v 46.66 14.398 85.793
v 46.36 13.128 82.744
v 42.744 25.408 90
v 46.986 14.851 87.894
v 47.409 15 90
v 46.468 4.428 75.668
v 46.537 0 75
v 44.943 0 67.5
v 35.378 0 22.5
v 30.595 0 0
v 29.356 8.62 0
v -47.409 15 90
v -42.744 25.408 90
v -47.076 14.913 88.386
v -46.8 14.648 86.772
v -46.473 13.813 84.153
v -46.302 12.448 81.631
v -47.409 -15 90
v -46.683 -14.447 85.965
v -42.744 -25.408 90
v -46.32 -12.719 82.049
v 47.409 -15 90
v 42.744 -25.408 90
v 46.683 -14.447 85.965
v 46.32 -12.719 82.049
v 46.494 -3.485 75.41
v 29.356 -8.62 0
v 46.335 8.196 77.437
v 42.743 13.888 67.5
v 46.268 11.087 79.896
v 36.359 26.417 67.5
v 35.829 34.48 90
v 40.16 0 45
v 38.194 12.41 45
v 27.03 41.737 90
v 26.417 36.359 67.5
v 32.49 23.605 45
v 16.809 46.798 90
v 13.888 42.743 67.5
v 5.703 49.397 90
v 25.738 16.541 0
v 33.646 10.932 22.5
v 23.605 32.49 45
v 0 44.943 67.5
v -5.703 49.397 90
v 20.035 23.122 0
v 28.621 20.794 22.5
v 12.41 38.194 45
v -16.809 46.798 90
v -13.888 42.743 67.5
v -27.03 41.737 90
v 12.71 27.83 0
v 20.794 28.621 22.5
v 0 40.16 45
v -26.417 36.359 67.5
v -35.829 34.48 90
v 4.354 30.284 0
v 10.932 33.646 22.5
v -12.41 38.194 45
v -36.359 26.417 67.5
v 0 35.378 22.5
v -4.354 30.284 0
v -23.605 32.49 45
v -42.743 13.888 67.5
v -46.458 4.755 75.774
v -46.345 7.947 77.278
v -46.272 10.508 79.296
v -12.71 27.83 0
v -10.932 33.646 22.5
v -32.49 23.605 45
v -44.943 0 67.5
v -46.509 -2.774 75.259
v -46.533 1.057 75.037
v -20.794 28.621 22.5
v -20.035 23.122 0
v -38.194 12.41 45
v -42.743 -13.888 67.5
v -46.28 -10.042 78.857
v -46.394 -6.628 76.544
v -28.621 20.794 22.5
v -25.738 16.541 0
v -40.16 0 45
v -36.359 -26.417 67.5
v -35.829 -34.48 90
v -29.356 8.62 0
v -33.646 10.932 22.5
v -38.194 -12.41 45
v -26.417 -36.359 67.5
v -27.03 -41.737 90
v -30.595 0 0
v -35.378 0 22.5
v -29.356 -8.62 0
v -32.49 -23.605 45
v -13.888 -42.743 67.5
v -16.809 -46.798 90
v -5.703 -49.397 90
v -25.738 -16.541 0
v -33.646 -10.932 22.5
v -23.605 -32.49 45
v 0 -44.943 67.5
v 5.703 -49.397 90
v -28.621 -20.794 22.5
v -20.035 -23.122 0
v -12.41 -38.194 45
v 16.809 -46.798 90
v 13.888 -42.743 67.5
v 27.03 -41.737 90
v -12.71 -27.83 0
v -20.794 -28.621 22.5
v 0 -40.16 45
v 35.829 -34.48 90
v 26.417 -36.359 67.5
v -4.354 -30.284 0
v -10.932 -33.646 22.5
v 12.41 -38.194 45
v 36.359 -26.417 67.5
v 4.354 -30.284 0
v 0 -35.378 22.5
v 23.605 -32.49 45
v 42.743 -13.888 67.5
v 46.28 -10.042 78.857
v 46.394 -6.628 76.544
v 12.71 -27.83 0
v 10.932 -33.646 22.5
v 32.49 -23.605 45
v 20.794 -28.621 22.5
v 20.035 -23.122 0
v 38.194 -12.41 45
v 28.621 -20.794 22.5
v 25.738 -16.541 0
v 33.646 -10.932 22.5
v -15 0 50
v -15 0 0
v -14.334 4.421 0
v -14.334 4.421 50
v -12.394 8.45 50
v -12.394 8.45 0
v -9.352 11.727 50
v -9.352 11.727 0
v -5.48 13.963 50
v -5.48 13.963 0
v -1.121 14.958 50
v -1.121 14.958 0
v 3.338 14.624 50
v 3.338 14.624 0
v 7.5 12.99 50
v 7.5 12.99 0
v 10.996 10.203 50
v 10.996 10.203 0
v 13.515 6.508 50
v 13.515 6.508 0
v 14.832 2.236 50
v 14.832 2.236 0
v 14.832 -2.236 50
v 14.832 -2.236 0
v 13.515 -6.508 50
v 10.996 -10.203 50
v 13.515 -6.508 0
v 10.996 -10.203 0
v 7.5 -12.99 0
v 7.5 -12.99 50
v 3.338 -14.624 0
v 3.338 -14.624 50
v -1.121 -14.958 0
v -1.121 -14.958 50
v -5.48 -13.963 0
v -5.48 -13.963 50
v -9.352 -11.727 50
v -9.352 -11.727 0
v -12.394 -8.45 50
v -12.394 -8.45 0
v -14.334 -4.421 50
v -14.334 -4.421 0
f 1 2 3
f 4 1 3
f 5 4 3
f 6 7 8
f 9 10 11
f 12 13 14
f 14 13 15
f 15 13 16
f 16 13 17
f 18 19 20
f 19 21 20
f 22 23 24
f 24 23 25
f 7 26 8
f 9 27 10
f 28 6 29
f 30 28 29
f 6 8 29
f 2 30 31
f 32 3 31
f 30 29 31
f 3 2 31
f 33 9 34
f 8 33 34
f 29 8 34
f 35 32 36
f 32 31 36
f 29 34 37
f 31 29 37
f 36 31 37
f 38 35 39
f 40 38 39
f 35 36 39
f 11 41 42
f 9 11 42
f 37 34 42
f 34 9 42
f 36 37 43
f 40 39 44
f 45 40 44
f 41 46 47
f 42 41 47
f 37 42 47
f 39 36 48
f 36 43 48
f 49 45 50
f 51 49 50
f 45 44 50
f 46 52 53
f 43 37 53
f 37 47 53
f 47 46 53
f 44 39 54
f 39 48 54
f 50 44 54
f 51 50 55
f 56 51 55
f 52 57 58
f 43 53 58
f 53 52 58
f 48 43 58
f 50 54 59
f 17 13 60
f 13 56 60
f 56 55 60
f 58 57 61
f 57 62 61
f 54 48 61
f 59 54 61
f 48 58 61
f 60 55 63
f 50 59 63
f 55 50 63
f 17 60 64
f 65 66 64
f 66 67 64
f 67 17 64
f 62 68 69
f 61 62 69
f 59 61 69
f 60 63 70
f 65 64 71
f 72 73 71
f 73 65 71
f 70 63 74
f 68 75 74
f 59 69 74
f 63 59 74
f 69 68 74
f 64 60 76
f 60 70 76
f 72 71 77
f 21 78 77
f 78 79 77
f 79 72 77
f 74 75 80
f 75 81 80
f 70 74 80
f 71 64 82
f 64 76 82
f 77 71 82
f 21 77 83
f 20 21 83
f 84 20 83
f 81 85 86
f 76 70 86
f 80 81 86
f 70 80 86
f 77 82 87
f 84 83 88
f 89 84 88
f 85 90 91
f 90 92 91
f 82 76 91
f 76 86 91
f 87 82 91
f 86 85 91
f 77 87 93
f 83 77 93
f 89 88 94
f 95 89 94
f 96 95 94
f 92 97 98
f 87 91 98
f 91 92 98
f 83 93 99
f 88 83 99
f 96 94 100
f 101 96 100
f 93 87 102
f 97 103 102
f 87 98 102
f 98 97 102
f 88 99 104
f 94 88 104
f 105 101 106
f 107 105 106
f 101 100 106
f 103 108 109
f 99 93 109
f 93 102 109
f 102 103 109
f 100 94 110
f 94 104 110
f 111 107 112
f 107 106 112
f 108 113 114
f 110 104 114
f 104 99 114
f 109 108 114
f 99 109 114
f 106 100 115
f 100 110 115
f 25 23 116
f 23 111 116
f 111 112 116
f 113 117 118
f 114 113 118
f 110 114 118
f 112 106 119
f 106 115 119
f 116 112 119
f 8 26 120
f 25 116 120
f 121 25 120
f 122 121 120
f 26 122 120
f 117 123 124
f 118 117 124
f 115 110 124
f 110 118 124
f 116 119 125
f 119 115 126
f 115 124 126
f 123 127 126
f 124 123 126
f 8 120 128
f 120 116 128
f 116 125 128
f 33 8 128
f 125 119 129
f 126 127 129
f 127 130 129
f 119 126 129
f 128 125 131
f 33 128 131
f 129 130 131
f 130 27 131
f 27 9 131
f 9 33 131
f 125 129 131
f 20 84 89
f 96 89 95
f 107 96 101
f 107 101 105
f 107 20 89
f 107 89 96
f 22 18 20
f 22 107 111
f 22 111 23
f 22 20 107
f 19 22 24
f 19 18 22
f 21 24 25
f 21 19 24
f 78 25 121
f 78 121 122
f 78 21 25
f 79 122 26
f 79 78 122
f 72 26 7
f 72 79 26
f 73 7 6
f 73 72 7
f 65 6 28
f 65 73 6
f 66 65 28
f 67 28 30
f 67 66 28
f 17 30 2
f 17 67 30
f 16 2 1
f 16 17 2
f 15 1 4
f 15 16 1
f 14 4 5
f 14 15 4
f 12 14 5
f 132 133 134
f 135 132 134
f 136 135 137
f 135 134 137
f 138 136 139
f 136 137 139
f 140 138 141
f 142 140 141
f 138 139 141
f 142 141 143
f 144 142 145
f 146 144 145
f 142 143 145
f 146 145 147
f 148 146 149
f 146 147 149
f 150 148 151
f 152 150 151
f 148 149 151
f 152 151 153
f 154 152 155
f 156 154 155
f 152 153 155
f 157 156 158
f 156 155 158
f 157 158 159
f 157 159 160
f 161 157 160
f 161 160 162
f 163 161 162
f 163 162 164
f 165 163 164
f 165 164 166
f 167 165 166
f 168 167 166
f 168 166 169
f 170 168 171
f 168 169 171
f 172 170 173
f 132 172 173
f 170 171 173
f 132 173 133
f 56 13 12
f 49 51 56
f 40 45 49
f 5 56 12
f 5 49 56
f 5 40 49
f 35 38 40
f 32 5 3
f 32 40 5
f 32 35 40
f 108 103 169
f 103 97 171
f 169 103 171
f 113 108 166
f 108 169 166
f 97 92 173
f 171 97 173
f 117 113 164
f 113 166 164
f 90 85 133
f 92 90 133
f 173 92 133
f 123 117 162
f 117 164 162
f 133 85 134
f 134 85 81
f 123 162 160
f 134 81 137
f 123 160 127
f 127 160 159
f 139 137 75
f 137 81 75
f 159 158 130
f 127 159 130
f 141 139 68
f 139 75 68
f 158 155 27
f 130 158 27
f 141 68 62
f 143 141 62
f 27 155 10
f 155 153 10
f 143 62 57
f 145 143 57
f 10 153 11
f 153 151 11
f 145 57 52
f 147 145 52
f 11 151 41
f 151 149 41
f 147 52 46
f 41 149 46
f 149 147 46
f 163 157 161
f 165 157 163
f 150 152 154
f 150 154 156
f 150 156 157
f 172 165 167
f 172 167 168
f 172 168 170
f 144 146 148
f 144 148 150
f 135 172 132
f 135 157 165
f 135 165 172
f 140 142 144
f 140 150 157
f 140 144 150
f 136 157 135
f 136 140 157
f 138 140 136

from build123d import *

# Parameters (mm, degrees)
SKETCH1_R               = 30.595
BOSS_EXTRUDE1_DEPTH     = 90
BOSS_EXTRUDE1_DRAFT     = -12
SKETCH2_R               = 15
CUT_EXTRUDE1_DEPTH      = 50
CUT_EXTRUDE4_DEPTH      = 115.215451058
CUT_EXTRUDE4_DEPTH_BACK = 115.215451058
SKETCH3_R               = 15


with BuildPart() as part:
    # Sketch1 → Boss-Extrude1 (with draft: the straight prism first)
    with BuildSketch(Plane.XY):
        Circle(SKETCH1_R)
    extrude(amount=BOSS_EXTRUDE1_DEPTH)
    # Boss-Extrude1: the draft: its side faces are tilted about the plane it starts from
    boss_extrude1_sides = [part.faces().sort_by_distance(p)[0] for p in [
        (-30.595, 0, 45),
    ]]
    draft(boss_extrude1_sides, Plane.XY, BOSS_EXTRUDE1_DRAFT)

    # Sketch2 → Cut-Extrude1 (cut)
    with BuildSketch(Plane(origin=(0, 0, 0), x_dir=(-1, 0, 0), z_dir=(0, 0, -1))):
        Circle(SKETCH2_R)
    extrude(amount=-CUT_EXTRUDE1_DEPTH, mode=Mode.SUBTRACT)

    # Sketch3 → Cut-Extrude4 (cut, two sides: drawn at the far end of the back side and taken through both)
    with BuildSketch(Plane(origin=(0, 0, 0), x_dir=(0, 0, -1), z_dir=(1, 0, 0)).offset(-CUT_EXTRUDE4_DEPTH_BACK)):
        with Locations((-90, 0)):
            Circle(SKETCH3_R)
    extrude(amount=CUT_EXTRUDE4_DEPTH + CUT_EXTRUDE4_DEPTH_BACK, mode=Mode.SUBTRACT)


solid = part.part
